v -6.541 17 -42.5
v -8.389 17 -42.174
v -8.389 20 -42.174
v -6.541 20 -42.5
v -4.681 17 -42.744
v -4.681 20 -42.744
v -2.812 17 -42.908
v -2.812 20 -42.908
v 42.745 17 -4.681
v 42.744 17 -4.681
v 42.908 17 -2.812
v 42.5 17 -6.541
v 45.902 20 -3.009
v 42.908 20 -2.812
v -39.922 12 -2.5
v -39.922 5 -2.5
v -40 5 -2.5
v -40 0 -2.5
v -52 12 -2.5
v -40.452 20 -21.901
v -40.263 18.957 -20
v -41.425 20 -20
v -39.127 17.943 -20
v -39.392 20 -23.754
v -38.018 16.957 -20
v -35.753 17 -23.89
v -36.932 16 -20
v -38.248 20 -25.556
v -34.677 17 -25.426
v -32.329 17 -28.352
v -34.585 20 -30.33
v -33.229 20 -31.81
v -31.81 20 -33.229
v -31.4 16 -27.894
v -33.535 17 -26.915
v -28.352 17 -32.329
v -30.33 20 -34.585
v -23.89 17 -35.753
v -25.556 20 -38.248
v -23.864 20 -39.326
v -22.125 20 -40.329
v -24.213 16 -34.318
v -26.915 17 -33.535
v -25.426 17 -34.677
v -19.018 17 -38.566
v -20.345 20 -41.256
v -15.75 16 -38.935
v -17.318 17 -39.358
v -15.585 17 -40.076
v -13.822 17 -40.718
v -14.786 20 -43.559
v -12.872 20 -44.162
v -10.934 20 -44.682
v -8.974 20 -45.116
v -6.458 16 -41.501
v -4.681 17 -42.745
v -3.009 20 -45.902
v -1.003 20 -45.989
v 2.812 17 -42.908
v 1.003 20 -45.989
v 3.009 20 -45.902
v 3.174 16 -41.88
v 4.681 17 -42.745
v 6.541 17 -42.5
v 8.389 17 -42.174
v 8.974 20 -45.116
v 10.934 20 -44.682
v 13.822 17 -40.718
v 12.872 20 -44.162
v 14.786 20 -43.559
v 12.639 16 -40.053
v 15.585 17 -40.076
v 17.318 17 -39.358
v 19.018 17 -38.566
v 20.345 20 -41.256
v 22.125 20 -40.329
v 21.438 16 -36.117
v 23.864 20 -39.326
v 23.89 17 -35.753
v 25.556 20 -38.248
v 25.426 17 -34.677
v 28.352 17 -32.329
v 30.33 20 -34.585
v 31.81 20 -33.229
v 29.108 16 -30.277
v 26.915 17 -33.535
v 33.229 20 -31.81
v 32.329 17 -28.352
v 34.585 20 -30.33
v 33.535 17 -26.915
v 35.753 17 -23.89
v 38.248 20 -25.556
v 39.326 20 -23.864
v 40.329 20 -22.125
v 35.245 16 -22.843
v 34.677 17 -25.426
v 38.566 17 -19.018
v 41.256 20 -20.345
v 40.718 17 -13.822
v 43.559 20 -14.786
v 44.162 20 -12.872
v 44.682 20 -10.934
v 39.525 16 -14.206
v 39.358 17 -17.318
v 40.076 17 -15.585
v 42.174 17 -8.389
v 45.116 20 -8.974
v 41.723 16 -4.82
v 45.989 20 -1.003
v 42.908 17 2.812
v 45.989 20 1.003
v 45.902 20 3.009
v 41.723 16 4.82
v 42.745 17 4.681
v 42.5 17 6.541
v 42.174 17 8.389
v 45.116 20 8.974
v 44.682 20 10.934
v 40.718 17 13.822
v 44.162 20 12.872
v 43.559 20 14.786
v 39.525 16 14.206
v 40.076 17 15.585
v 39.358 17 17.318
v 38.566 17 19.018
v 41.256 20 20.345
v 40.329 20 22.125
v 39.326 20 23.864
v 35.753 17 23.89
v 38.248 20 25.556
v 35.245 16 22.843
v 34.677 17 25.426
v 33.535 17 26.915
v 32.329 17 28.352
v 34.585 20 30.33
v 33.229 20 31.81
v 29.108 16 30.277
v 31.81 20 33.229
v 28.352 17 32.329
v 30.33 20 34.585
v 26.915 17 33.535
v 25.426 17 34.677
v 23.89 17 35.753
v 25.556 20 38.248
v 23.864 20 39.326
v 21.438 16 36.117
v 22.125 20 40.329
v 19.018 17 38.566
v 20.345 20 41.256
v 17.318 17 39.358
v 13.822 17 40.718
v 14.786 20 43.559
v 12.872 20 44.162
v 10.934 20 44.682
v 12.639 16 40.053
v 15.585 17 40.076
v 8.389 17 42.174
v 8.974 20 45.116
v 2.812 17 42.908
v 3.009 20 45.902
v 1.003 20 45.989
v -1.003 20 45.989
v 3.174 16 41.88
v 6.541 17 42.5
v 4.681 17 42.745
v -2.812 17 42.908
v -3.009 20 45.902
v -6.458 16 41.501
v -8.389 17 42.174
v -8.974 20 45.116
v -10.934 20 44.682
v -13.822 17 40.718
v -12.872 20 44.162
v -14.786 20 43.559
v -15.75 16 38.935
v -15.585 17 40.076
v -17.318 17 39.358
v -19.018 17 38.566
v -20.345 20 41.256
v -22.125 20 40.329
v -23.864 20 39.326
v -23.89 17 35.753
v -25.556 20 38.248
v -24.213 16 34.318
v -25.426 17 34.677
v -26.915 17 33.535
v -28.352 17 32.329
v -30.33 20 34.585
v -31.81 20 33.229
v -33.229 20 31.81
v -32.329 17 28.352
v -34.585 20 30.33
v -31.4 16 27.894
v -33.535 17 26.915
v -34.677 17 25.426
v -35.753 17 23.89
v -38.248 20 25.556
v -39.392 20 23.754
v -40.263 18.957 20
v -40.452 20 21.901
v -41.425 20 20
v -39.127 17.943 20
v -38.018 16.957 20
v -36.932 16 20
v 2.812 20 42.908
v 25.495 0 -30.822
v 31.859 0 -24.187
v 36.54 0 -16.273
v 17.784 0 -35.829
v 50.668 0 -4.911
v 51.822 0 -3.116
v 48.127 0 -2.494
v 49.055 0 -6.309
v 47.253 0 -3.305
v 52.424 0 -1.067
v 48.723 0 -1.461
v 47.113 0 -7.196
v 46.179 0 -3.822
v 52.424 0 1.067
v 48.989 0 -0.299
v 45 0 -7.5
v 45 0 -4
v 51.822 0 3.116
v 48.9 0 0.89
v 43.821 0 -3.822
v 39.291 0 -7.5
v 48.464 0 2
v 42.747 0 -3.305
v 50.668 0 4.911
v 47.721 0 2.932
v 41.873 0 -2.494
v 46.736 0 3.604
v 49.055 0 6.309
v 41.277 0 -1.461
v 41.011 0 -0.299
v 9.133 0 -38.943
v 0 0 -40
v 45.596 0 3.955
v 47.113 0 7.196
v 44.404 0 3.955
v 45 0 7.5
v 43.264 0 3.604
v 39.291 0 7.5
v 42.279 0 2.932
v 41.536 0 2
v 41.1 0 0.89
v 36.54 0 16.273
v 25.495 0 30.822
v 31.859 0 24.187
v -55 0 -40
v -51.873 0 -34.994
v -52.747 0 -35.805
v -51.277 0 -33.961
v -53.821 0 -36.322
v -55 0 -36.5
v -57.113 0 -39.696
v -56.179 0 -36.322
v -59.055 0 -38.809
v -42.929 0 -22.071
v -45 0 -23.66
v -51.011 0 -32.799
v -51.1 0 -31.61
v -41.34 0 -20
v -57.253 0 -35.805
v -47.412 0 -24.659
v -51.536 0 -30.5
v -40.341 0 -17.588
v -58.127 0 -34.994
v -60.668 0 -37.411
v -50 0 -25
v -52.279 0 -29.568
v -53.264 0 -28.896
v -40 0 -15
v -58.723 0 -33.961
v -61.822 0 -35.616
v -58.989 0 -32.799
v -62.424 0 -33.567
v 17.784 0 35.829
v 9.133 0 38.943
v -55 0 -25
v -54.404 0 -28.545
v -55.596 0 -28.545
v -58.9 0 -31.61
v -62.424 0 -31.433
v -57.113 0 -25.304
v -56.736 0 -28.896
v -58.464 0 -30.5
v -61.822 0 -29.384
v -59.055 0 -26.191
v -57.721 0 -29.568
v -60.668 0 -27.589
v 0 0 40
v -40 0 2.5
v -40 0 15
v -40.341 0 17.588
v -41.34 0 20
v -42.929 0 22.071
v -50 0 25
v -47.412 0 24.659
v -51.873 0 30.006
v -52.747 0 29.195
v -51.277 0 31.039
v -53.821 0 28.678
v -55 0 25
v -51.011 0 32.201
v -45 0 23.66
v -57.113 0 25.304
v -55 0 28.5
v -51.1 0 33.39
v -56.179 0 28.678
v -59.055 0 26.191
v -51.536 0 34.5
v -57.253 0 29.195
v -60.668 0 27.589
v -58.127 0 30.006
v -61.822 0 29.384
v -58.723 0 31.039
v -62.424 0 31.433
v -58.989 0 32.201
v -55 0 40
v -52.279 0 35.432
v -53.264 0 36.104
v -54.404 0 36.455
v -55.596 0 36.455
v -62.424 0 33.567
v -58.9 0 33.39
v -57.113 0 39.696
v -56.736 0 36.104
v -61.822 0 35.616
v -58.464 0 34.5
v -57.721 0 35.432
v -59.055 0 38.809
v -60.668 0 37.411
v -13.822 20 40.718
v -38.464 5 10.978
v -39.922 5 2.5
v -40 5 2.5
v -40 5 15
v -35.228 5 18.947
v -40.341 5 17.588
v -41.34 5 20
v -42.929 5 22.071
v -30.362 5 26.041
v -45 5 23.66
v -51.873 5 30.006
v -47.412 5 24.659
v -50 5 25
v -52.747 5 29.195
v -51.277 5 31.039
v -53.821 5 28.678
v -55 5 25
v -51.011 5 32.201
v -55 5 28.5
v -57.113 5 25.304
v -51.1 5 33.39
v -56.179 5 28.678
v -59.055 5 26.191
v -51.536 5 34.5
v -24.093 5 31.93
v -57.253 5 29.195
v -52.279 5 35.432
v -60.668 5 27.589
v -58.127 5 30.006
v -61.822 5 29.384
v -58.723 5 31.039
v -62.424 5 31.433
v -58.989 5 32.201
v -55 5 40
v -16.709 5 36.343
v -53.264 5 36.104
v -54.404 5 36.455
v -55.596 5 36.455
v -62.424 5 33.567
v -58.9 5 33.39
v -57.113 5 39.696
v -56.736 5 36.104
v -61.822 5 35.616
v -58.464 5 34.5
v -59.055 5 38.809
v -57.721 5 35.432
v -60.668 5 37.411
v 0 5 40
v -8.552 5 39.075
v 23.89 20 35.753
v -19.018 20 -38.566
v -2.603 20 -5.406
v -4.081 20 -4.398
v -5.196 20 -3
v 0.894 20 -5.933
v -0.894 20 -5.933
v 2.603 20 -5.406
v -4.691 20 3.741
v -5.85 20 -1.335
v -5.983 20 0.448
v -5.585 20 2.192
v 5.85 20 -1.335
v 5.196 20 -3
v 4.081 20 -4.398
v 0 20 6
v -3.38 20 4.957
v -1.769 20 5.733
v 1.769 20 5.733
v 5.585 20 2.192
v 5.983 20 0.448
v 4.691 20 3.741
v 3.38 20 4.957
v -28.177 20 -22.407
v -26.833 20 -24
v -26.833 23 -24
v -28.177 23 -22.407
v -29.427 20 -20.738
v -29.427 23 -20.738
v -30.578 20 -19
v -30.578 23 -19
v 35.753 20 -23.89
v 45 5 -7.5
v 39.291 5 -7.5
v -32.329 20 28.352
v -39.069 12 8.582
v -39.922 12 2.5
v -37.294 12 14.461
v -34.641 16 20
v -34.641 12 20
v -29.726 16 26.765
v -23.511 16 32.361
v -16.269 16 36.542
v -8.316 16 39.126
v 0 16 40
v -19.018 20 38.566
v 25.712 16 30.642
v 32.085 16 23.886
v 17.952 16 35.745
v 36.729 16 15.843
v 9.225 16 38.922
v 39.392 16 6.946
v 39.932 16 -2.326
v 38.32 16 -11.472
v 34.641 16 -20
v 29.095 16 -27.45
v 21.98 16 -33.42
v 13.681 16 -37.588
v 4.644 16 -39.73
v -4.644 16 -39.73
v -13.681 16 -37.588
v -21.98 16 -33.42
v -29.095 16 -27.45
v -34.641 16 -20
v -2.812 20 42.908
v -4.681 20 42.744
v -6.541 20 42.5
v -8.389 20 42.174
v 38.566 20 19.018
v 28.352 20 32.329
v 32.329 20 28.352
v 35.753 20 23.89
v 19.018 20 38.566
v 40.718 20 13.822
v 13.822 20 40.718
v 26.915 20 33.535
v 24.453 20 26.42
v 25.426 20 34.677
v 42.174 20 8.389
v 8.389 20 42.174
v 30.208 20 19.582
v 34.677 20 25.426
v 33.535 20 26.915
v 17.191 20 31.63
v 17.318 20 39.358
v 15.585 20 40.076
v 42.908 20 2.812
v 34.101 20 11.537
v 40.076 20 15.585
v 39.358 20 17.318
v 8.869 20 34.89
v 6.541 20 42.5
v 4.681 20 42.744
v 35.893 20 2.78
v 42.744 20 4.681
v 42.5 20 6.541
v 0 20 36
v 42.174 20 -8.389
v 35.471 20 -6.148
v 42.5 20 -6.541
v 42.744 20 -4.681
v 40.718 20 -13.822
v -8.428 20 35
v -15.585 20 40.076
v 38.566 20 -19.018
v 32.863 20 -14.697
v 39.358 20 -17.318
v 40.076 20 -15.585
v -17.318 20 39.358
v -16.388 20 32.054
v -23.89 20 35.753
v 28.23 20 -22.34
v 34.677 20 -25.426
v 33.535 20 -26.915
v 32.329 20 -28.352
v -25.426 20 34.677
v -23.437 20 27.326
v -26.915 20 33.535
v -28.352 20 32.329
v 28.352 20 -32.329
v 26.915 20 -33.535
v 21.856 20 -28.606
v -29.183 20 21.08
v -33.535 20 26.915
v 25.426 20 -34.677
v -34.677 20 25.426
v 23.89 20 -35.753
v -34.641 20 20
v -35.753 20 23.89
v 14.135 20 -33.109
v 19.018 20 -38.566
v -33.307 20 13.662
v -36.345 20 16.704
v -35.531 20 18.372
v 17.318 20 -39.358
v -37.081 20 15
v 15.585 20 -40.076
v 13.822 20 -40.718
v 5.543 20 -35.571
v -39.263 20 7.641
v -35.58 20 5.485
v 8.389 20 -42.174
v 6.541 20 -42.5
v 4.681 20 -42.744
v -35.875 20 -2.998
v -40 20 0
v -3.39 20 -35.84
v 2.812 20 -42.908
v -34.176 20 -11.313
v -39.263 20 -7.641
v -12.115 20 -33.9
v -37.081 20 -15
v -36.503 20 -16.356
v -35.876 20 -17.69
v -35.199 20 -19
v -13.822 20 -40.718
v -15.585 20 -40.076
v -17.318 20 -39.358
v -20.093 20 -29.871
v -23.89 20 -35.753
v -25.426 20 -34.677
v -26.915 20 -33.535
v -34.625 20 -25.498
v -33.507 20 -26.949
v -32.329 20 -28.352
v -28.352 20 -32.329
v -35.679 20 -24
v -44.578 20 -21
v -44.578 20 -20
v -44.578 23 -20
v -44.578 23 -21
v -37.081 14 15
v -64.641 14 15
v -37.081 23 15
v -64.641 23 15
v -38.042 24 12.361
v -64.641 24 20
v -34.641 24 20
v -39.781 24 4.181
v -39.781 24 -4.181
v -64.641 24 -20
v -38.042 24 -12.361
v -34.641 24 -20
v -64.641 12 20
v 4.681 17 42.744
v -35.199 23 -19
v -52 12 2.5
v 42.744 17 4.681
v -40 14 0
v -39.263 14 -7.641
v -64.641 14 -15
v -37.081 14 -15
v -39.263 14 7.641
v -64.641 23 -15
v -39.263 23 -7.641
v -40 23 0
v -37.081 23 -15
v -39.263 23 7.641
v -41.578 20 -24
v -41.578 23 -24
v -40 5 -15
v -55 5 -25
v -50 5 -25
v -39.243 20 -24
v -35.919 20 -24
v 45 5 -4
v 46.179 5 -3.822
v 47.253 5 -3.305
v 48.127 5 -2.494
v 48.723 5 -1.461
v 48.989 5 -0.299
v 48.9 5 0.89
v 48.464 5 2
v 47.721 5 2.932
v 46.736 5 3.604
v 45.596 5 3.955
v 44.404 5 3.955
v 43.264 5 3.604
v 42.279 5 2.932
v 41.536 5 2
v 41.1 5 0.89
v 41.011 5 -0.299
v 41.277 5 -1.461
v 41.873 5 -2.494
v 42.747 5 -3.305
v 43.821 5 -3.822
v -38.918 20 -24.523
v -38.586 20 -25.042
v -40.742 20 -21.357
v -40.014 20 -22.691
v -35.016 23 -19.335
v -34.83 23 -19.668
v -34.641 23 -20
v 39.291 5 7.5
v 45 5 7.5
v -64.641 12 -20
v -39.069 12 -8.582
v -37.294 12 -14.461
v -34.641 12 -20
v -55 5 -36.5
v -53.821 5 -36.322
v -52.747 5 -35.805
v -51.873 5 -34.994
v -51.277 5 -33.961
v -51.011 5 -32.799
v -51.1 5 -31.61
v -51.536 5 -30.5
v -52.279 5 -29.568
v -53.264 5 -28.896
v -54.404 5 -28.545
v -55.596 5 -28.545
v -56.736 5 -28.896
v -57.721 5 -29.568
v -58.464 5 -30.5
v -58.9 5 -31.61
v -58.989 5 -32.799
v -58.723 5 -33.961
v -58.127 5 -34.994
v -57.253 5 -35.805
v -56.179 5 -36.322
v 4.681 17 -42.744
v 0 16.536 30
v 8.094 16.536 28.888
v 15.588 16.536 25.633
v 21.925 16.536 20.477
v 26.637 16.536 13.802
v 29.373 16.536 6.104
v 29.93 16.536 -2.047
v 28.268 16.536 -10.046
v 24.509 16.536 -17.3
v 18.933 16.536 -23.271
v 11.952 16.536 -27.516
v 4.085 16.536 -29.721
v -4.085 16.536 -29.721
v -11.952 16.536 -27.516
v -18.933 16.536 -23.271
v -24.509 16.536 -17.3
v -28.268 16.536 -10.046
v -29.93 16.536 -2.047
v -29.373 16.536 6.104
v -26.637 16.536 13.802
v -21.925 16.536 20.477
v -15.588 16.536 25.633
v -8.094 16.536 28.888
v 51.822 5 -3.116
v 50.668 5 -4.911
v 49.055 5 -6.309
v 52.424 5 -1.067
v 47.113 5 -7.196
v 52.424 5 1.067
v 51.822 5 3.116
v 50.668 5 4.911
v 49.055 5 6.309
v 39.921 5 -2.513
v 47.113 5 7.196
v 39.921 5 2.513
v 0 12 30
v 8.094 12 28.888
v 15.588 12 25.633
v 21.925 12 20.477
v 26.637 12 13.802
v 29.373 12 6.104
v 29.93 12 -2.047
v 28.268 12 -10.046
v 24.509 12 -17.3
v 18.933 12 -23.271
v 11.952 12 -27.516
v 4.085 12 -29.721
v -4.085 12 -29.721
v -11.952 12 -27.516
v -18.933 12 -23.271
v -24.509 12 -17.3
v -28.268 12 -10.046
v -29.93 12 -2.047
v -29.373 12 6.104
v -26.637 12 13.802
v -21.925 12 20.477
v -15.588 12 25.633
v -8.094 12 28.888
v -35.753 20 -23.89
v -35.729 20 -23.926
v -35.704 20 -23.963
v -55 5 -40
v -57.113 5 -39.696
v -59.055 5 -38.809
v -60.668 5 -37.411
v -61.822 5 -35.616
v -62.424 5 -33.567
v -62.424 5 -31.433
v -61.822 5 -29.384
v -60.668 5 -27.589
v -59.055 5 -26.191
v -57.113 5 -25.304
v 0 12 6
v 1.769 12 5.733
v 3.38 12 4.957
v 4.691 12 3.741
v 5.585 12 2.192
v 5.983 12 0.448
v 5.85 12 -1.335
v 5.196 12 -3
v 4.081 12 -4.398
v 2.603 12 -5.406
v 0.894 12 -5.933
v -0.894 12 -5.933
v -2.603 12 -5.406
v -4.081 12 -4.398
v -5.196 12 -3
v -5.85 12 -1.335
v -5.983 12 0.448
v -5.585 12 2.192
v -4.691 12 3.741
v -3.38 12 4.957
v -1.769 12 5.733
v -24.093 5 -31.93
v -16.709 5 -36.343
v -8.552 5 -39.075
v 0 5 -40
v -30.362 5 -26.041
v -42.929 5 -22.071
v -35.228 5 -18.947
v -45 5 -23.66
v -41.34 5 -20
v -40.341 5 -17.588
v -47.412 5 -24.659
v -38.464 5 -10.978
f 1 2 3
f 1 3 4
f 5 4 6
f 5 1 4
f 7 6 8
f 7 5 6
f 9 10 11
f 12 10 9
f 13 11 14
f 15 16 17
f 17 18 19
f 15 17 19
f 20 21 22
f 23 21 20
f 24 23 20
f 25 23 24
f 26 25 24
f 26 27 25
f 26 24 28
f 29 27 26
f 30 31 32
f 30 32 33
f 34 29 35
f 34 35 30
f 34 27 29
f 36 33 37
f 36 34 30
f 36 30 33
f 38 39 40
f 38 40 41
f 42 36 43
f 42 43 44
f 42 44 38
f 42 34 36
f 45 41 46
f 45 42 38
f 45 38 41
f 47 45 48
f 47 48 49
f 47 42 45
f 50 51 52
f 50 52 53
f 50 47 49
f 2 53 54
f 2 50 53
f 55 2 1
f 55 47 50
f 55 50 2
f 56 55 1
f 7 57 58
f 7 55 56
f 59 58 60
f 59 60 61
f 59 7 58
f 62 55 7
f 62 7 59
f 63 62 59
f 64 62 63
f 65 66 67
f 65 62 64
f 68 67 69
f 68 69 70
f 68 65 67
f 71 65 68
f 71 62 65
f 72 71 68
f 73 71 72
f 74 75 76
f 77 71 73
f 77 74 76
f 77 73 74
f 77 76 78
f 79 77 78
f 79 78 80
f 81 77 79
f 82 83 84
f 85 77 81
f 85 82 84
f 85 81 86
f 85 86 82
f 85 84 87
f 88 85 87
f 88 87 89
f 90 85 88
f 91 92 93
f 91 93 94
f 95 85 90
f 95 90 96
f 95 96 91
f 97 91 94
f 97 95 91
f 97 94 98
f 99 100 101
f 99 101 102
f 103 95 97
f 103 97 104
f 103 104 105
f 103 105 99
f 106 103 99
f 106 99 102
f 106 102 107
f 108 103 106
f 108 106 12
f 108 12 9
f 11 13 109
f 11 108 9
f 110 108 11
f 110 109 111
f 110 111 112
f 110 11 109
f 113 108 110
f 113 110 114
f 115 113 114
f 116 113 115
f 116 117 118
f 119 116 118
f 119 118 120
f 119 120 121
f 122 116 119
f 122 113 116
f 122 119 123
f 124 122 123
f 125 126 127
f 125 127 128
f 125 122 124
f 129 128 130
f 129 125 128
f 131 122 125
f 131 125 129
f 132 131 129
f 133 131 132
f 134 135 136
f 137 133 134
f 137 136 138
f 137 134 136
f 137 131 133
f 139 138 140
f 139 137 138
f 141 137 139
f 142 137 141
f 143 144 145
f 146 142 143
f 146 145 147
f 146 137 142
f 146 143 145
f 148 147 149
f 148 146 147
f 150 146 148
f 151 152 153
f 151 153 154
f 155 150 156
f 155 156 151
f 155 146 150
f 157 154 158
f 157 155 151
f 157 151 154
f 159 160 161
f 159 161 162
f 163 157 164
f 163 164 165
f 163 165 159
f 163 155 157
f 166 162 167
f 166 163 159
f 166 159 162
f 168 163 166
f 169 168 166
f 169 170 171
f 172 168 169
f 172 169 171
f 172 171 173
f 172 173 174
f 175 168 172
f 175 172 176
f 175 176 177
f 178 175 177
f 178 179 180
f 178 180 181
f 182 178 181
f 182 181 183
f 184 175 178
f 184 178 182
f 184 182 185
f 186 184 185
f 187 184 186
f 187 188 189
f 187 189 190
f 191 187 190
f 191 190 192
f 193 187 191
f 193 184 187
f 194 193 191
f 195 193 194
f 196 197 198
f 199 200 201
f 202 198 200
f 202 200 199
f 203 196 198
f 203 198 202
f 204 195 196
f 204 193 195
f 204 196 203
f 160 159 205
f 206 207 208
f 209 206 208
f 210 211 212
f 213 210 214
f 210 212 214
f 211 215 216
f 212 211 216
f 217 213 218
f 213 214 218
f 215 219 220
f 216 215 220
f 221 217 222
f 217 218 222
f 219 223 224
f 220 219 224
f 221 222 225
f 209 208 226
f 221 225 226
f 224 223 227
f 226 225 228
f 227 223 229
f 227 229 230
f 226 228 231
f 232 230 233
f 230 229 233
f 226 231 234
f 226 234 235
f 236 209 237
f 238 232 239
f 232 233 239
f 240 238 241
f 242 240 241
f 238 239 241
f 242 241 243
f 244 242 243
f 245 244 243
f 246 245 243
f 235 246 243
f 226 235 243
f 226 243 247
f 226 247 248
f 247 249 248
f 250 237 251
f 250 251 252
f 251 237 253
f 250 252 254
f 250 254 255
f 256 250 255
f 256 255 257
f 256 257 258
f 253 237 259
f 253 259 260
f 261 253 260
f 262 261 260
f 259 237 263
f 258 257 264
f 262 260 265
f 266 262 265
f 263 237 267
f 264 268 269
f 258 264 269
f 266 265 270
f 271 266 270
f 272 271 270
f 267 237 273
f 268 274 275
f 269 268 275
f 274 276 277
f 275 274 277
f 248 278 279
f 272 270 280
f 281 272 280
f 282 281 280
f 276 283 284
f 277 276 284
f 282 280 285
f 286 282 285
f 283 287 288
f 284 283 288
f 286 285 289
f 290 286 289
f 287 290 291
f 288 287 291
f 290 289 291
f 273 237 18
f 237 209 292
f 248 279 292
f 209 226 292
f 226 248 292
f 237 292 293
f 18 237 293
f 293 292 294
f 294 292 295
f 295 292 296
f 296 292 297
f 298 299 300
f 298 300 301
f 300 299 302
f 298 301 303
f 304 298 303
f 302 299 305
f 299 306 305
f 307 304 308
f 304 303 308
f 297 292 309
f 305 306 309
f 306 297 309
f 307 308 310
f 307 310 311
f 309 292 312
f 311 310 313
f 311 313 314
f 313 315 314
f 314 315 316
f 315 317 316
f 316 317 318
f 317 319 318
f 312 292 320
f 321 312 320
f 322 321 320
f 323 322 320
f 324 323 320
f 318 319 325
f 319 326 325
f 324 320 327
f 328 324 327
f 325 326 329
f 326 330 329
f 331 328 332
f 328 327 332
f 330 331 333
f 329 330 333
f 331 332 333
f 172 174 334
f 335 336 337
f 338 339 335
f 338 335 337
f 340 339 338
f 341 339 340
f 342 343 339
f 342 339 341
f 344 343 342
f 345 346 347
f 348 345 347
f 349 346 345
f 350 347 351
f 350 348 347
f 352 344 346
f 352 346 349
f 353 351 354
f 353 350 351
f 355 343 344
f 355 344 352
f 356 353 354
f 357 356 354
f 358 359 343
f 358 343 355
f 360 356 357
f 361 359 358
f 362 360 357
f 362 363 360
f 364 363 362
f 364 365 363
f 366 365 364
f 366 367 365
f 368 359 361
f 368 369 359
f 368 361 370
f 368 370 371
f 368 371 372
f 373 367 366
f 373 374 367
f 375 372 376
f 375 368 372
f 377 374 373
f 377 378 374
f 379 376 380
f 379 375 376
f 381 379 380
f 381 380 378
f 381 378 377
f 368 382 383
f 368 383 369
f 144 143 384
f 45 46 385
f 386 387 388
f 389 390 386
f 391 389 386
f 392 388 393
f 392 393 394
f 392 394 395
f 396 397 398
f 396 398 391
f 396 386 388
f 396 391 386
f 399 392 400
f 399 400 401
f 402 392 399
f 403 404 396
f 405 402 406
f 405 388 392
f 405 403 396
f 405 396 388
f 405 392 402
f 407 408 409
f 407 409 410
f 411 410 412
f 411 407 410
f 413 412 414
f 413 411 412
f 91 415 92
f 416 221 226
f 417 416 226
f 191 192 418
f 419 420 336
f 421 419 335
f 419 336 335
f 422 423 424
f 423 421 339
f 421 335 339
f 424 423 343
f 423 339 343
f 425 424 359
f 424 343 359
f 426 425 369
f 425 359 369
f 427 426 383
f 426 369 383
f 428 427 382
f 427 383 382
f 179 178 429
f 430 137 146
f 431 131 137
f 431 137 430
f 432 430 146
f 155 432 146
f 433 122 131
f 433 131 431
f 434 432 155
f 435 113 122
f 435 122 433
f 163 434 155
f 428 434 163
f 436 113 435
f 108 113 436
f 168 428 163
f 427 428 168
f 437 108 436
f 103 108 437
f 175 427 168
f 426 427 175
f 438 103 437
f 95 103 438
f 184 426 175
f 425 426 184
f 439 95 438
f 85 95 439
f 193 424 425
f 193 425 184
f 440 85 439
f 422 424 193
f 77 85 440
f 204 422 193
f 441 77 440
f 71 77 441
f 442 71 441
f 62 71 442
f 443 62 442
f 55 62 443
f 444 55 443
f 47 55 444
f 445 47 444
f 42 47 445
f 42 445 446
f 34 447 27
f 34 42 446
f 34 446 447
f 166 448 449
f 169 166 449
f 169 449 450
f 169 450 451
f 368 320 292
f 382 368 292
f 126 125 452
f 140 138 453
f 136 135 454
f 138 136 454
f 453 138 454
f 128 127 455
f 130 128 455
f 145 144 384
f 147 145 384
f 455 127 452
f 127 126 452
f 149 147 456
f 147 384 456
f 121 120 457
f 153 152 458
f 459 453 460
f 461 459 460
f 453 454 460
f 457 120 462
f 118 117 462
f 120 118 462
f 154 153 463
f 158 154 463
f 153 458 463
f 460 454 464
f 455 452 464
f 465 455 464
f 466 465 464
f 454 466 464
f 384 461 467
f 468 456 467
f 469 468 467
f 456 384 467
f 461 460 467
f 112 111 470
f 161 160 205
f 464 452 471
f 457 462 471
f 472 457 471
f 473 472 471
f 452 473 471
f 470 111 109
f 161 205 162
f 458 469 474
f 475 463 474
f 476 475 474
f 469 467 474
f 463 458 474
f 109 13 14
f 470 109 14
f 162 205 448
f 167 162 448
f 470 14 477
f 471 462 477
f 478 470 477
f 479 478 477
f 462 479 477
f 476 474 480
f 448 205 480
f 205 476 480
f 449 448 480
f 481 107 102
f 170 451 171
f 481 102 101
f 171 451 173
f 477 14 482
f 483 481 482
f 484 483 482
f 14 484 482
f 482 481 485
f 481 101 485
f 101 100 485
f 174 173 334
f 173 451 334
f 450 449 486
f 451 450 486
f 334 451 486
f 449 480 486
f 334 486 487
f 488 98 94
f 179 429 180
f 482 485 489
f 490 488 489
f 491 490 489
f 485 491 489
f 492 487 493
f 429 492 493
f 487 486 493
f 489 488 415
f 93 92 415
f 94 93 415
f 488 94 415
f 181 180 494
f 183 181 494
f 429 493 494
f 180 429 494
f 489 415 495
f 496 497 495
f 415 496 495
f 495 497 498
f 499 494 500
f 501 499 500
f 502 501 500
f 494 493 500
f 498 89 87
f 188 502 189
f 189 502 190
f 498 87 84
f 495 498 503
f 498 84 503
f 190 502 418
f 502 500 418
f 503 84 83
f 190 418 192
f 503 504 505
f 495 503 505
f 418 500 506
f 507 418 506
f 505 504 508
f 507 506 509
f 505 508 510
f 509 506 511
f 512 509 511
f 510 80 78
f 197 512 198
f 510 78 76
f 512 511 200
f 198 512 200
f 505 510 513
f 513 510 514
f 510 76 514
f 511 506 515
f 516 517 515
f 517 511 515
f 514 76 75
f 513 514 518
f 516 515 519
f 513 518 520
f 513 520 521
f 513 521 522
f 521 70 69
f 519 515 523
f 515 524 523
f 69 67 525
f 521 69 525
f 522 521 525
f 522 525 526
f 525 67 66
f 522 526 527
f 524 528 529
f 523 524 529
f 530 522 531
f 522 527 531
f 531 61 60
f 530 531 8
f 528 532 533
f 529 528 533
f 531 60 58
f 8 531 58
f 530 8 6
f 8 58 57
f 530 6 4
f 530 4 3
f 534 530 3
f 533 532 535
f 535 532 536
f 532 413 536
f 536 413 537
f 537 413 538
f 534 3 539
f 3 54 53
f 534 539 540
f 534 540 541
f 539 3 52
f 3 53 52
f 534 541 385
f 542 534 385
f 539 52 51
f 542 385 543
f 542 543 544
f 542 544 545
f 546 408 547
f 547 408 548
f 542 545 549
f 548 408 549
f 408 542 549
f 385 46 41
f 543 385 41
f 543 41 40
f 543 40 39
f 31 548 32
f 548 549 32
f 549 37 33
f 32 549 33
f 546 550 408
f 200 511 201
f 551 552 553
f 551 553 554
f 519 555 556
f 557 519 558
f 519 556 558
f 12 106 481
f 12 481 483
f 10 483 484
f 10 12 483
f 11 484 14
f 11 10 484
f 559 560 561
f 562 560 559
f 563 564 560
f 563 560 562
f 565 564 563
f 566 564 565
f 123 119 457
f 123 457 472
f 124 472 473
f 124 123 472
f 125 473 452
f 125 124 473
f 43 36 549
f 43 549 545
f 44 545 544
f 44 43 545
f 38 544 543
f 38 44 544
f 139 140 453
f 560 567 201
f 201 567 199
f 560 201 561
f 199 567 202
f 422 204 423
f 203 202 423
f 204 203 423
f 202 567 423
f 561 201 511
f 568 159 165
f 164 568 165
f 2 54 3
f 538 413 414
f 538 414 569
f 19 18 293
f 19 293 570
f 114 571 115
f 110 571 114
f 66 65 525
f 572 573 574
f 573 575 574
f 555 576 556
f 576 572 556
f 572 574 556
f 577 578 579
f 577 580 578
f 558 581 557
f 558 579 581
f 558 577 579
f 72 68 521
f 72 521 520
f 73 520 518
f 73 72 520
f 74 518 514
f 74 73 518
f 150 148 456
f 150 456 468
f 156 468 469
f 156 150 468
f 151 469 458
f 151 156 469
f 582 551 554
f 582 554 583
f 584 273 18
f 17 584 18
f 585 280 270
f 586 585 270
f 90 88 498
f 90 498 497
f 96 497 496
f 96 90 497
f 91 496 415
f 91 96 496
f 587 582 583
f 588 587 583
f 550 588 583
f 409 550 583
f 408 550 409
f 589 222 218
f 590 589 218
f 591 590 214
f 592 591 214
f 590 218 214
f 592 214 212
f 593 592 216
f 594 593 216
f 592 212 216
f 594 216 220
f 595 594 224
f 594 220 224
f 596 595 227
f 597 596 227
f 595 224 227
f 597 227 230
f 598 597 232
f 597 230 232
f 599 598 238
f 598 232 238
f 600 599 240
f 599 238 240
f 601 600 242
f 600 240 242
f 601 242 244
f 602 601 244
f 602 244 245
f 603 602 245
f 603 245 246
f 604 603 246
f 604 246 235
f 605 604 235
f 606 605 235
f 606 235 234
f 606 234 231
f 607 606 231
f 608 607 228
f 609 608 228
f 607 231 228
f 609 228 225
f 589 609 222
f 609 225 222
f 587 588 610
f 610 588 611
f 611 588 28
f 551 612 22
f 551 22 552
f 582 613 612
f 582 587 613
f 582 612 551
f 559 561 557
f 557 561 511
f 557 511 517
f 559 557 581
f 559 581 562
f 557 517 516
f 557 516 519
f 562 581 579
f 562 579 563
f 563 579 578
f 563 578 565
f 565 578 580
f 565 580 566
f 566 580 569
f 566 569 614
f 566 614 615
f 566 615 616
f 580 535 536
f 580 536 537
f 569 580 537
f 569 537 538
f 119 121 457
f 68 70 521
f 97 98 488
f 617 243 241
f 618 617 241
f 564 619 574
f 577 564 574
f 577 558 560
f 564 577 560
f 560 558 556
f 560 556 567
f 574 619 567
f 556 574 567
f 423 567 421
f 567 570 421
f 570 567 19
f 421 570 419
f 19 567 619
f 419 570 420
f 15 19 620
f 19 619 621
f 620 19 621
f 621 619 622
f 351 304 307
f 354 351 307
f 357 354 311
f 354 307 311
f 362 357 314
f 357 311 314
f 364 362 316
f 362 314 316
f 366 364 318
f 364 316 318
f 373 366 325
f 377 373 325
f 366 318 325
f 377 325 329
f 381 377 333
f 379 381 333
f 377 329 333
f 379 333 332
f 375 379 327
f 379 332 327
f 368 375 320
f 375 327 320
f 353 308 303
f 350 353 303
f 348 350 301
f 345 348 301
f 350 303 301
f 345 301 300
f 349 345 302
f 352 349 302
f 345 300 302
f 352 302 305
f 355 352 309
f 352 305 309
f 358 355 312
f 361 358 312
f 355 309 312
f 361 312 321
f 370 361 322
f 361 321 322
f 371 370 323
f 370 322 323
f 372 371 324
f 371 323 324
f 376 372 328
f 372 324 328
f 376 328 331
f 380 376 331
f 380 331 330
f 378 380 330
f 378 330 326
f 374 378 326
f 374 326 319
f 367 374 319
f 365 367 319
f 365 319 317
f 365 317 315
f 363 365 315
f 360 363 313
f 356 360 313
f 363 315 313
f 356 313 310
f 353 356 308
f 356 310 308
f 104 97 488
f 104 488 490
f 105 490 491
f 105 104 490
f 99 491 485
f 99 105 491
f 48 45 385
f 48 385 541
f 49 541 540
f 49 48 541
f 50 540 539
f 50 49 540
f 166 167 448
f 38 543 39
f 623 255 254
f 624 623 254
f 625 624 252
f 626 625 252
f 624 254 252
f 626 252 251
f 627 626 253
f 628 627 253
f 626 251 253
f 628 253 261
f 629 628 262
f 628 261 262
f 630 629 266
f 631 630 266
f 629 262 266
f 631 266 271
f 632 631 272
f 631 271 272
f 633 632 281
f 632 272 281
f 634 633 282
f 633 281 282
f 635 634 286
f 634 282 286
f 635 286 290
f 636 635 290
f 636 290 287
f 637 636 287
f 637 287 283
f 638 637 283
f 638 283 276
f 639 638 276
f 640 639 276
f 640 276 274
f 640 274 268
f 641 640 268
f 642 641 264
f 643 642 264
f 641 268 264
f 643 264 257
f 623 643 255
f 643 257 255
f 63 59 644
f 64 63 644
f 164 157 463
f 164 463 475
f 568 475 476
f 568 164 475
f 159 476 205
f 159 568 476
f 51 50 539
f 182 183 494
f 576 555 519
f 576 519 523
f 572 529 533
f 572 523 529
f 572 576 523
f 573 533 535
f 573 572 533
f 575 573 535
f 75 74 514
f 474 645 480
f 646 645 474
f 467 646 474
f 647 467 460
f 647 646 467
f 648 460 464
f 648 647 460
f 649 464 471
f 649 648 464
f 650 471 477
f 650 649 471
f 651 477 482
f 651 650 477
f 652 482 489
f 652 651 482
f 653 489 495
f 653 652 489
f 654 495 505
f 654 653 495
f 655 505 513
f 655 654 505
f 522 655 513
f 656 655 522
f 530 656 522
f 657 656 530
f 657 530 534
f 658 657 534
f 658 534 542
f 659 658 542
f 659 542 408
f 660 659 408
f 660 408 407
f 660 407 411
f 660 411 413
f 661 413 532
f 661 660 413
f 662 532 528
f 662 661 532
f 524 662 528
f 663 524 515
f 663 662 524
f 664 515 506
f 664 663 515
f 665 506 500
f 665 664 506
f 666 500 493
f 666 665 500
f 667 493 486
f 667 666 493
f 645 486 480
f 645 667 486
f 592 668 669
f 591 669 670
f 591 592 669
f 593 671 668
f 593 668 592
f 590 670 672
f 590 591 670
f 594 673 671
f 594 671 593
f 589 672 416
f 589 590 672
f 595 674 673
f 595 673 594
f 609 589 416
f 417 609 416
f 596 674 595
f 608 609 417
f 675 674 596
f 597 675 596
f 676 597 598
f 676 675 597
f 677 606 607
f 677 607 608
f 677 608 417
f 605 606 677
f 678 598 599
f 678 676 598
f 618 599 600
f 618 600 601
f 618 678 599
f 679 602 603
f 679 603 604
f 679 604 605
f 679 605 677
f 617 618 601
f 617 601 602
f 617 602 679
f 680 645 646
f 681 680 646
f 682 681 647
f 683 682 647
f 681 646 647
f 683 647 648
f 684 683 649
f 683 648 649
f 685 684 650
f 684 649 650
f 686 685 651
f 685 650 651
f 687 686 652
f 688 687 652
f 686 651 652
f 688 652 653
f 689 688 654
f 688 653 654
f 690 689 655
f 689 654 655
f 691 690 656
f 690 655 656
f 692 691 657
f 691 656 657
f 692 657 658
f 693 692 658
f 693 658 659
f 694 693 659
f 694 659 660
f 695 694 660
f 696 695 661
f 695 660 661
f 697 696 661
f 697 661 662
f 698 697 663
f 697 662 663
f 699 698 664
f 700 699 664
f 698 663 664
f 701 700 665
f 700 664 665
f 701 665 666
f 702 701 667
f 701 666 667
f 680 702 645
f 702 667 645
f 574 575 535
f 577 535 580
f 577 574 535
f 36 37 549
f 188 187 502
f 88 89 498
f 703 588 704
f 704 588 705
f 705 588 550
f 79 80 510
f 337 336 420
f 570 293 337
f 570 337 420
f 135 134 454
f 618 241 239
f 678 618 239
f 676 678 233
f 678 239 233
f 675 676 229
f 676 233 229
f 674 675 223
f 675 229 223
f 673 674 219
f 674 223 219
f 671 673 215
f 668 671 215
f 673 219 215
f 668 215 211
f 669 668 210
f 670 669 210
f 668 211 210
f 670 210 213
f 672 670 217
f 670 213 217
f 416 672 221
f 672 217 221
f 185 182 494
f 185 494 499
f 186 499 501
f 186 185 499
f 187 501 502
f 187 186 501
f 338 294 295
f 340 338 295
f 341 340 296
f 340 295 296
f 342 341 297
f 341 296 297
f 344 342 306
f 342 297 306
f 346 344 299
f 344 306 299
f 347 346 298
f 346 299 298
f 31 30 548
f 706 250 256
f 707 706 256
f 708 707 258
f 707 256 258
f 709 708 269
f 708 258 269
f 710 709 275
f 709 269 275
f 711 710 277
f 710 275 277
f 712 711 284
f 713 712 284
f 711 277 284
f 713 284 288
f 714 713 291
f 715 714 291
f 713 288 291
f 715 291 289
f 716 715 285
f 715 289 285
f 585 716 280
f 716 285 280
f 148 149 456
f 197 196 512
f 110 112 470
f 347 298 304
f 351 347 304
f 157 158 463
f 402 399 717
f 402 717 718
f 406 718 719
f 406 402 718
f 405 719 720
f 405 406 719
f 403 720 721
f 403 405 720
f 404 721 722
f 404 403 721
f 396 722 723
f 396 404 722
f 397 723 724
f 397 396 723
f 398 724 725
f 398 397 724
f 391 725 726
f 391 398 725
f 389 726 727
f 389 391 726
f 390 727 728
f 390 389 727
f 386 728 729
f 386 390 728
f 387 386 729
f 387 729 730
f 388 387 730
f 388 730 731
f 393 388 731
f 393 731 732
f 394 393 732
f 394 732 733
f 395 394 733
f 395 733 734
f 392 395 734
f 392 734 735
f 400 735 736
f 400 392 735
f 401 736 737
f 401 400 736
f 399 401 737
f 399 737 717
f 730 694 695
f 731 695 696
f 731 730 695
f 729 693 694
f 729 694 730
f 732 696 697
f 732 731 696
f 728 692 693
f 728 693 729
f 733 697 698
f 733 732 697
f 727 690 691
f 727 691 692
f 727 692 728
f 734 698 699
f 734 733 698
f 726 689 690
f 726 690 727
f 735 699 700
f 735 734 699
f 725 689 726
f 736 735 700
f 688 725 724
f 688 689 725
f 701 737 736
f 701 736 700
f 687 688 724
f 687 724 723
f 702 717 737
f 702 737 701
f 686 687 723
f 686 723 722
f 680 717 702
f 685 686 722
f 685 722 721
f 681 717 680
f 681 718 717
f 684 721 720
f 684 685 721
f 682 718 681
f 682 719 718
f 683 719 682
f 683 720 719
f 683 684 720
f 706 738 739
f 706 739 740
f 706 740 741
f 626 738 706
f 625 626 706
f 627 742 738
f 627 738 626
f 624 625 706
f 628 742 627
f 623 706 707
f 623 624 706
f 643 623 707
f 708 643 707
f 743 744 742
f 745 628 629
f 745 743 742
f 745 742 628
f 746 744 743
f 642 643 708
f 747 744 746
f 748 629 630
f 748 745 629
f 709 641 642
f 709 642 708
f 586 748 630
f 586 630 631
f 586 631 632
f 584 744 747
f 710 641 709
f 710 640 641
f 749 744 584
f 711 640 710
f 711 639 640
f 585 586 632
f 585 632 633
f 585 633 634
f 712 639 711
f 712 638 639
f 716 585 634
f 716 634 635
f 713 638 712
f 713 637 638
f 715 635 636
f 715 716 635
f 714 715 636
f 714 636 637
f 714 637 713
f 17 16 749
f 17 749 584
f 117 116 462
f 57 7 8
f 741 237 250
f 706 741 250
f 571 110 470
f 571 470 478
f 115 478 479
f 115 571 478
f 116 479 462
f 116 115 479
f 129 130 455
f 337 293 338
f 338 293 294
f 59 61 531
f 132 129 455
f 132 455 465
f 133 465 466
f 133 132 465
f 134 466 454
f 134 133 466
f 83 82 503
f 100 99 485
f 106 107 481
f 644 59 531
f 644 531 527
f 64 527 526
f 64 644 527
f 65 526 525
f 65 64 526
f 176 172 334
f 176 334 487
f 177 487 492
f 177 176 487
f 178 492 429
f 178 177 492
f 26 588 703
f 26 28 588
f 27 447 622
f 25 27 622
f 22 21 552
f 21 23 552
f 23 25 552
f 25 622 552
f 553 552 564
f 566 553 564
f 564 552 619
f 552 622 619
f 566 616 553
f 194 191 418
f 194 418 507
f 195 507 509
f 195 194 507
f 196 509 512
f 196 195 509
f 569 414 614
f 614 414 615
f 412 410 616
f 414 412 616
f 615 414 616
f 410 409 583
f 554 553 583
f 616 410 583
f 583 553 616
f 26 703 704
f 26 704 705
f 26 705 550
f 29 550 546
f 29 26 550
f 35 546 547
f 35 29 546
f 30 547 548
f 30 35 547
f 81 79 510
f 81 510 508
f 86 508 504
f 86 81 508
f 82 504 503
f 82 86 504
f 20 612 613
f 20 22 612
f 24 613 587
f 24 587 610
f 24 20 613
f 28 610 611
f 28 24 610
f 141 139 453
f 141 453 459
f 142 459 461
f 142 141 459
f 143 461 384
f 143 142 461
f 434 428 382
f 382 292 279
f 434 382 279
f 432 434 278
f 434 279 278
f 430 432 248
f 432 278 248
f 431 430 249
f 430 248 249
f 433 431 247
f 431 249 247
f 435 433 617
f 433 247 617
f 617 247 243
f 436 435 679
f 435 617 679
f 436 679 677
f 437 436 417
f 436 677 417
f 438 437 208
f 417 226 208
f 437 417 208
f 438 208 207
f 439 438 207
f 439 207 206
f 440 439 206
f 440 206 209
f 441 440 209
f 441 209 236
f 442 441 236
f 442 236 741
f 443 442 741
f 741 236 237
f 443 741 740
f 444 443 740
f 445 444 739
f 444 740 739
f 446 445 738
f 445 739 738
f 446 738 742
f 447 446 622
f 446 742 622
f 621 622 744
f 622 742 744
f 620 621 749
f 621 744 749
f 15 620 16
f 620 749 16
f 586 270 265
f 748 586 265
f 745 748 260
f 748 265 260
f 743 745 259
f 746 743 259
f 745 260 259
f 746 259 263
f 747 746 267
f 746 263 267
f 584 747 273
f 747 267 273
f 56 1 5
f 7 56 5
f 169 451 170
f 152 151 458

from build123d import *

# Parameters (mm, degrees)
SKETCH1_R                = 40
BOSS_EXTRUDE1_DEPTH      = 20
SKETCH2_R                = 4
BOSS_EXTRUDE2_DEPTH      = 5
SKETCH3_R                = 30
SKETCH3_R_2              = 6
CUT_EXTRUDE2_DEPTH       = 8
CHAMFER1_SIZE            = 6
CHAMFER1_SIZE2           = 3.464101615
BOSS_EXTRUDE3_DEPTH      = 4
BOSS_EXTRUDE3_DEPTH_BACK = 8
CUT_EXTRUDE3_REACH       = 128.087
CUT_EXTRUDE3_END_RADIUS  = 40
SKETCH7_W                = 30
SKETCH7_H                = 9
RIB1_REACH               = 81.715
SKETCH9_WALL_W           = 178.400308644
SKETCH9_WALL_H           = 5
BOSS_EXTRUDE10_DEPTH     = 3
BOSS_EXTRUDE12_START     = -4
BOSS_EXTRUDE12_DEPTH     = 4
CHAMFER2_SIZE            = 4
CUT_EXTRUDE4_REACH       = 83.82
CIRPATTERN1_START        = 17
CIRPATTERN1_DEPTH        = 3


# Read off the part's stored shape, not the designer's step: CirPattern1
with BuildPart() as part:
    # Sketch1 → Boss-Extrude1 (new body)
    with BuildSketch(Plane(origin=(0, 0, 0), x_dir=(1, 0, 0), z_dir=(0, 1, 0))):
        with Locations(Location((0, 0, 0), (0, 0, 270))):
            Circle(SKETCH1_R)
    extrude(amount=BOSS_EXTRUDE1_DEPTH)

    # Sketch2 → Boss-Extrude2 (add)
    # profile 1 of 2: a face of its own
    with BuildSketch(Plane.XZ):
        with BuildLine():
            Line((-55, 40), (0, 40))
            Line((0, 40), (0, -40))
            Line((0, -40), (-55, -40))
            ThreePointArc((-55, -40), (-62.5, -32.5), (-55, -25))
            Line((-55, -25), (-50, -25))
            ThreePointArc((-50, -25), (-42.928932188, -22.071067812), (-40, -15))
            Line((-40, -15), (-40, 15))
            ThreePointArc((-40, 15), (-42.928932188, 22.071067812), (-50, 25))
            Line((-50, 25), (-55, 25))
            ThreePointArc((-55, 25), (-62.5, 32.5), (-55, 40))
        make_face()
        with Locations(Location((-55, 32.5, 0), (0, 0, 270))):
            Circle(SKETCH2_R, mode=Mode.SUBTRACT)
        with Locations(Location((-55, -32.5, 0), (0, 0, 270))):
            Circle(SKETCH2_R, mode=Mode.SUBTRACT)
    # profile 2 of 2: a face of its own
    with BuildSketch(Plane.XZ):
        with BuildLine():
            Line((22.970276422, 7.5), (45, 7.5))
            ThreePointArc((45, 7.5), (52.5, 0), (45, -7.5))
            Line((45, -7.5), (22.970276422, -7.5))
            Line((22.970276422, -7.5), (22.970276422, 7.5))
        make_face()
        with Locations(Location((45, 0, 0), (0, 0, 270))):
            Circle(SKETCH2_R, mode=Mode.SUBTRACT)
    extrude(amount=-BOSS_EXTRUDE2_DEPTH)

    # Sketch3 → Cut-Extrude2 (cut)
    with BuildSketch(Plane(origin=(0, 20, 0), x_dir=(1, 0, 0), z_dir=(0, 1, 0))):
        with Locations(Location((0, 0, 0), (0, 0, 270))):
            Circle(SKETCH3_R)
        with Locations(Location((0, 0, 0), (0, 0, 270))):
            Circle(SKETCH3_R_2, mode=Mode.SUBTRACT)
    extrude(amount=-CUT_EXTRUDE2_DEPTH, mode=Mode.SUBTRACT)

    # Chamfer1
    chamfer1_edges = [part.edges().sort_by_distance(p)[0] for p in [
        (0, 20, -30),
    ]]
    chamfer1_side = [part.faces().sort_by_distance(p)[0] for p in [
        (0, 20, -38.86862915),
    ]]
    chamfer(chamfer1_edges, length=CHAMFER1_SIZE, length2=CHAMFER1_SIZE2, reference=chamfer1_side[0])

    # Sketch6 → Boss-Extrude3 (add, two sides: drawn at the far end of the back side and taken through both)
    with BuildSketch(Plane(origin=(0, 20, 0), x_dir=(1, 0, 0), z_dir=(0, 1, 0)).offset(-BOSS_EXTRUDE3_DEPTH_BACK)):
        with BuildLine():
            Line((-34.641016151, 20), (-64.641016151, 20))
            Line((-64.641016151, 20), (-64.641016151, -20))
            Line((-64.641016151, -20), (-34.641016151, -20))
            ThreePointArc((-34.641016151, -20), (-40, 0), (-34.641016151, 20))
        make_face()
    extrude(amount=BOSS_EXTRUDE3_DEPTH + BOSS_EXTRUDE3_DEPTH_BACK)

    # Cut-Extrude3: up to this cylinder (the profile starts outside it)
    cut_extrude3_end = Plane(origin=(0, 18.5, 0), z_dir=(0, -1, 0)) * Cylinder(CUT_EXTRUDE3_END_RADIUS, 337.174, mode=Mode.PRIVATE)
    # Sketch7 → Cut-Extrude3 (cut, up to the surface)
    with BuildSketch(Plane.ZY.offset(64.641016151), mode=Mode.PRIVATE) as cut_extrude3_sk1:
        with Locations((0, 18.5)):
            Rectangle(SKETCH7_W, SKETCH7_H)
    cut_extrude3_tool1 = extrude(cut_extrude3_sk1.sketch, amount=-CUT_EXTRUDE3_REACH, mode=Mode.PRIVATE) - cut_extrude3_end
    add(cut_extrude3_tool1.solids().sort_by_distance((-64.641016, 18.5, 0))[0], mode=Mode.SUBTRACT)

    # Sketch9 wall → Rib1 (add, up to next)
    with BuildSketch(Plane(origin=(-46, 6, 0), x_dir=(-0.707106781187, 0.707106781187, 0), z_dir=(-0.707106781187, -0.707106781187, 0)), mode=Mode.PRIVATE) as rib1_sk1:
        Rectangle(SKETCH9_WALL_W, SKETCH9_WALL_H)
    rib1_tool1 = extrude(rib1_sk1.sketch, amount=-RIB1_REACH, mode=Mode.PRIVATE) - part.part
    add(rib1_tool1.solids().sort_by_distance((-46, 6, 0))[0])

    # Sketch13 → Boss-Extrude10 (add)
    with BuildSketch(Plane(origin=(0, 20, 0), x_dir=(1, 0, 0), z_dir=(0, 1, 0))):
        with BuildLine():
            Line((-30.577769703, 19), (-44.577769703, 19))
            Line((-44.577769703, 19), (-44.577769703, 21))
            Line((-44.577769703, 21), (-41.577769703, 24))
            Line((-41.577769703, 24), (-26.83281573, 24))
            ThreePointArc((-26.83281573, 24), (-28.813952001, 21.581384804), (-30.577769703, 19))
        make_face()
    extrude(amount=BOSS_EXTRUDE10_DEPTH)

    # Sketch14 → Boss-Extrude12 (add)
    with BuildSketch(Plane(origin=(0, 20, 0), x_dir=(1, 0, 0), z_dir=(0, 1, 0)).offset(BOSS_EXTRUDE12_START)):
        with BuildLine():
            Line((-34.641016151, 20), (-41.424630354, 20))
            ThreePointArc((-41.424630354, 20), (46, 0), (-41.424630354, -20))
            Line((-41.424630354, -20), (-34.641016151, -20))
            ThreePointArc((-34.641016151, -20), (40, 0), (-34.641016151, 20))
        make_face()
    extrude(amount=BOSS_EXTRUDE12_DEPTH)

    # Chamfer2
    chamfer2_edges = [part.edges().sort_by_distance(p)[0] for p in [
        (46, 16, 0),
    ]]
    chamfer(chamfer2_edges, length=CHAMFER2_SIZE - 0.0001)  # a hair under: the kernel refuses the full size

    # Sketch15 → Cut-Extrude4 (cut, up to next)
    with BuildSketch(Plane(origin=(0, 20, 0), x_dir=(1, 0, 0), z_dir=(0, 1, 0)), mode=Mode.PRIVATE) as cut_extrude4_sk1:
        with BuildLine():
            Line((-8.388883847, -42.173767057), (-8.974154813, -45.116122899))
            ThreePointArc((-8.974154813, -45.116122899), (-6.004204842, -45.606463623), (-3.008543945, -45.901510469))
            Line((-3.008543945, -45.901510469), (-2.812334557, -42.907933699))
            ThreePointArc((-2.812334557, -42.907933699), (-5.612626265, -42.632129039), (-8.388883847, -42.173767057))
        make_face()
    cut_extrude4_tool1 = extrude(cut_extrude4_sk1.sketch, amount=-CUT_EXTRUDE4_REACH, mode=Mode.PRIVATE) & part.part
    add(cut_extrude4_tool1.solids().sort_by_distance((-5.806468, 20, 44.104502))[0], mode=Mode.SUBTRACT)

    # CirPattern1 outline → CirPattern1 (cut)
    with BuildSketch(Plane(origin=(0, 0, 0), x_dir=(1, 0, 0), z_dir=(0, 1, 0)).offset(CIRPATTERN1_START)):
        with BuildLine():
            ThreePointArc((8.388883847, -42.173767057), (5.612626266, -42.632129039), (2.812334557, -42.907933699))
            Line((2.812334557, -42.907933699), (3.008543945, -45.901510469))
            Line((3.008543945, -45.901510469), (3.080542753, -47))
            Line((3.080542753, -47), (9.348881267, -47))
            Line((9.348881267, -47), (8.974154813, -45.116122899))
            Line((8.974154813, -45.116122899), (8.388883847, -42.173767057))
        make_face()
        with BuildLine():
            Line((-23.177835023, -47), (-15.954350166, -47))
            Line((-15.954350166, -47), (-14.786215404, -43.558785957))
            Line((-14.786215404, -43.558785957), (-13.821897008, -40.717995568))
            ThreePointArc((-13.821897008, -40.717995568), (-16.455387592, -39.726819898), (-19.018413679, -38.565527886))
            Line((-19.018413679, -38.565527886), (-20.34527975, -41.256146111))
            Line((-20.34527975, -41.256146111), (-23.177835023, -47))
        make_face()
        with BuildLine():
            Line((14.786215404, -43.558785957), (15.954350166, -47))
            Line((15.954350166, -47), (23.177835023, -47))
            Line((23.177835023, -47), (20.34527975, -41.256146111))
            Line((20.34527975, -41.256146111), (19.018413679, -38.565527886))
            ThreePointArc((19.018413679, -38.565527886), (16.455387592, -39.726819898), (13.821897008, -40.717995568))
            Line((13.821897008, -40.717995568), (14.786215404, -43.558785957))
        make_face()
        with BuildLine():
            Line((-40, -47), (-31.404395982, -47))
            Line((-31.404395982, -47), (-25.556230719, -38.247602166))
            Line((-25.556230719, -38.247602166), (-23.88952002, -35.753193329))
            ThreePointArc((-23.88952002, -35.753193329), (-26.176741447, -34.114193633), (-28.351870049, -32.329111722))
            Line((-28.351870049, -32.329111722), (-30.329907495, -34.584631144))
            Line((-30.329907495, -34.584631144), (-40, -45.61125832))
            Line((-40, -45.61125832), (-40, -47))
        make_face()
        with BuildLine():
            Line((25.556230719, -38.247602166), (31.404395982, -47))
            Line((31.404395982, -47), (41.217893767, -47))
            Line((41.217893767, -47), (30.329907495, -34.584631144))
            Line((30.329907495, -34.584631144), (28.351870049, -32.329111722))
            ThreePointArc((28.351870049, -32.329111722), (26.176741447, -34.114193633), (23.88952002, -35.753193329))
            Line((23.88952002, -35.753193329), (25.556230719, -38.247602166))
        make_face()
        with BuildLine():
            Line((-40, -26.727145517), (-40, -35.079058523))
            Line((-40, -35.079058523), (-34.584631144, -30.329907495))
            Line((-34.584631144, -30.329907495), (-32.329111722, -28.351870049))
            ThreePointArc((-32.329111722, -28.351870049), (-34.114193633, -26.176741447), (-35.753193329, -23.88952002))
            Line((-35.753193329, -23.88952002), (-38.247602166, -25.556230719))
            Line((-38.247602166, -25.556230719), (-40, -26.727145517))
        make_face()
        with BuildLine():
            Line((34.584631144, -30.329907495), (47, -41.217893767))
            Line((47, -41.217893767), (47, -31.404395982))
            Line((47, -31.404395982), (38.247602166, -25.556230719))
            Line((38.247602166, -25.556230719), (35.753193329, -23.88952002))
            ThreePointArc((35.753193329, -23.88952002), (34.114193633, -26.176741447), (32.329111722, -28.351870049))
            Line((32.329111722, -28.351870049), (34.584631144, -30.329907495))
        make_face()
        with BuildLine():
            Line((-40, 35.079058523), (-40, 26.727145517))
            Line((-40, 26.727145517), (-38.247602166, 25.556230719))
            Line((-38.247602166, 25.556230719), (-35.753193329, 23.88952002))
            ThreePointArc((-35.753193329, 23.88952002), (-34.114193633, 26.176741447), (-32.329111722, 28.351870049))
            Line((-32.329111722, 28.351870049), (-34.584631144, 30.329907495))
            Line((-34.584631144, 30.329907495), (-40, 35.079058523))
        make_face()
        with BuildLine():
            Line((41.256146111, -20.34527975), (47, -23.177835023))
            Line((47, -23.177835023), (47, -15.954350166))
            Line((47, -15.954350166), (43.558785957, -14.786215404))
            Line((43.558785957, -14.786215404), (40.717995568, -13.821897008))
            ThreePointArc((40.717995568, -13.821897008), (39.726819898, -16.455387592), (38.565527886, -19.018413679))
            Line((38.565527886, -19.018413679), (41.256146111, -20.34527975))
        make_face()
        with BuildLine():
            Line((-40, 47), (-40, 45.61125832))
            Line((-40, 45.61125832), (-30.329907495, 34.584631144))
            Line((-30.329907495, 34.584631144), (-28.351870049, 32.329111722))
            ThreePointArc((-28.351870049, 32.329111722), (-26.176741447, 34.114193633), (-23.88952002, 35.753193329))
            Line((-23.88952002, 35.753193329), (-25.556230719, 38.247602166))
            Line((-25.556230719, 38.247602166), (-31.404395982, 47))
            Line((-31.404395982, 47), (-40, 47))
        make_face()
        with BuildLine():
            Line((45.116122899, -8.974154813), (47, -9.348881267))
            Line((47, -9.348881267), (47, -3.080542753))
            Line((47, -3.080542753), (45.901510469, -3.008543945))
            Line((45.901510469, -3.008543945), (42.907933699, -2.812334557))
            ThreePointArc((42.907933699, -2.812334557), (42.632129039, -5.612626266), (42.173767057, -8.388883847))
            Line((42.173767057, -8.388883847), (45.116122899, -8.974154813))
        make_face()
        with BuildLine():
            Line((45.901510469, 3.008543945), (47, 3.080542753))
            Line((47, 3.080542753), (47, 9.348881267))
            Line((47, 9.348881267), (45.116122899, 8.974154813))
            Line((45.116122899, 8.974154813), (42.173767057, 8.388883847))
            ThreePointArc((42.173767057, 8.388883847), (42.632129039, 5.612626266), (42.907933699, 2.812334557))
            Line((42.907933699, 2.812334557), (45.901510469, 3.008543945))
        make_face()
        with BuildLine():
            Line((-15.954350166, 47), (-23.177835023, 47))
            Line((-23.177835023, 47), (-20.34527975, 41.256146111))
            Line((-20.34527975, 41.256146111), (-19.018413679, 38.565527886))
            ThreePointArc((-19.018413679, 38.565527886), (-16.455387592, 39.726819898), (-13.821897008, 40.717995568))
            Line((-13.821897008, 40.717995568), (-14.786215404, 43.558785957))
            Line((-14.786215404, 43.558785957), (-15.954350166, 47))
        make_face()
        with BuildLine():
            Line((43.558785957, 14.786215404), (47, 15.954350166))
            Line((47, 15.954350166), (47, 23.177835023))
            Line((47, 23.177835023), (41.256146111, 20.34527975))
            Line((41.256146111, 20.34527975), (38.565527886, 19.018413679))
            ThreePointArc((38.565527886, 19.018413679), (39.726819898, 16.455387592), (40.717995568, 13.821897008))
            Line((40.717995568, 13.821897008), (43.558785957, 14.786215404))
        make_face()
        with BuildLine():
            Line((-3.080542753, 47), (-9.348881267, 47))
            Line((-9.348881267, 47), (-8.974154813, 45.116122899))
            Line((-8.974154813, 45.116122899), (-8.388883847, 42.173767057))
            ThreePointArc((-8.388883847, 42.173767057), (-5.612626266, 42.632129039), (-2.812334557, 42.907933699))
            Line((-2.812334557, 42.907933699), (-3.008543945, 45.901510469))
            Line((-3.008543945, 45.901510469), (-3.080542753, 47))
        make_face()
        with BuildLine():
            Line((38.247602166, 25.556230719), (47, 31.404395982))
            Line((47, 31.404395982), (47, 41.217893767))
            Line((47, 41.217893767), (34.584631144, 30.329907495))
            Line((34.584631144, 30.329907495), (32.329111722, 28.351870049))
            ThreePointArc((32.329111722, 28.351870049), (34.114193633, 26.176741447), (35.753193329, 23.88952002))
            Line((35.753193329, 23.88952002), (38.247602166, 25.556230719))
        make_face()
        with BuildLine():
            Line((9.348881267, 47), (3.080542753, 47))
            Line((3.080542753, 47), (3.008543945, 45.901510469))
            Line((3.008543945, 45.901510469), (2.812334557, 42.907933699))
            ThreePointArc((2.812334557, 42.907933699), (5.612626266, 42.632129039), (8.388883847, 42.173767057))
            Line((8.388883847, 42.173767057), (8.974154813, 45.116122899))
            Line((8.974154813, 45.116122899), (9.348881267, 47))
        make_face()
        with BuildLine():
            Line((23.177835023, 47), (15.954350166, 47))
            Line((15.954350166, 47), (14.786215404, 43.558785957))
            Line((14.786215404, 43.558785957), (13.821897008, 40.717995568))
            ThreePointArc((13.821897008, 40.717995568), (16.455387592, 39.726819898), (19.018413679, 38.565527886))
            Line((19.018413679, 38.565527886), (20.34527975, 41.256146111))
            Line((20.34527975, 41.256146111), (23.177835023, 47))
        make_face()
        with BuildLine():
            Line((30.329907495, 34.584631144), (41.217893767, 47))
            Line((41.217893767, 47), (31.404395982, 47))
            Line((31.404395982, 47), (25.556230719, 38.247602166))
            Line((25.556230719, 38.247602166), (23.88952002, 35.753193329))
            ThreePointArc((23.88952002, 35.753193329), (26.176741447, 34.114193633), (28.351870049, 32.329111722))
            Line((28.351870049, 32.329111722), (30.329907495, 34.584631144))
        make_face()
    extrude(amount=CIRPATTERN1_DEPTH, mode=Mode.SUBTRACT)


solid = part.part
